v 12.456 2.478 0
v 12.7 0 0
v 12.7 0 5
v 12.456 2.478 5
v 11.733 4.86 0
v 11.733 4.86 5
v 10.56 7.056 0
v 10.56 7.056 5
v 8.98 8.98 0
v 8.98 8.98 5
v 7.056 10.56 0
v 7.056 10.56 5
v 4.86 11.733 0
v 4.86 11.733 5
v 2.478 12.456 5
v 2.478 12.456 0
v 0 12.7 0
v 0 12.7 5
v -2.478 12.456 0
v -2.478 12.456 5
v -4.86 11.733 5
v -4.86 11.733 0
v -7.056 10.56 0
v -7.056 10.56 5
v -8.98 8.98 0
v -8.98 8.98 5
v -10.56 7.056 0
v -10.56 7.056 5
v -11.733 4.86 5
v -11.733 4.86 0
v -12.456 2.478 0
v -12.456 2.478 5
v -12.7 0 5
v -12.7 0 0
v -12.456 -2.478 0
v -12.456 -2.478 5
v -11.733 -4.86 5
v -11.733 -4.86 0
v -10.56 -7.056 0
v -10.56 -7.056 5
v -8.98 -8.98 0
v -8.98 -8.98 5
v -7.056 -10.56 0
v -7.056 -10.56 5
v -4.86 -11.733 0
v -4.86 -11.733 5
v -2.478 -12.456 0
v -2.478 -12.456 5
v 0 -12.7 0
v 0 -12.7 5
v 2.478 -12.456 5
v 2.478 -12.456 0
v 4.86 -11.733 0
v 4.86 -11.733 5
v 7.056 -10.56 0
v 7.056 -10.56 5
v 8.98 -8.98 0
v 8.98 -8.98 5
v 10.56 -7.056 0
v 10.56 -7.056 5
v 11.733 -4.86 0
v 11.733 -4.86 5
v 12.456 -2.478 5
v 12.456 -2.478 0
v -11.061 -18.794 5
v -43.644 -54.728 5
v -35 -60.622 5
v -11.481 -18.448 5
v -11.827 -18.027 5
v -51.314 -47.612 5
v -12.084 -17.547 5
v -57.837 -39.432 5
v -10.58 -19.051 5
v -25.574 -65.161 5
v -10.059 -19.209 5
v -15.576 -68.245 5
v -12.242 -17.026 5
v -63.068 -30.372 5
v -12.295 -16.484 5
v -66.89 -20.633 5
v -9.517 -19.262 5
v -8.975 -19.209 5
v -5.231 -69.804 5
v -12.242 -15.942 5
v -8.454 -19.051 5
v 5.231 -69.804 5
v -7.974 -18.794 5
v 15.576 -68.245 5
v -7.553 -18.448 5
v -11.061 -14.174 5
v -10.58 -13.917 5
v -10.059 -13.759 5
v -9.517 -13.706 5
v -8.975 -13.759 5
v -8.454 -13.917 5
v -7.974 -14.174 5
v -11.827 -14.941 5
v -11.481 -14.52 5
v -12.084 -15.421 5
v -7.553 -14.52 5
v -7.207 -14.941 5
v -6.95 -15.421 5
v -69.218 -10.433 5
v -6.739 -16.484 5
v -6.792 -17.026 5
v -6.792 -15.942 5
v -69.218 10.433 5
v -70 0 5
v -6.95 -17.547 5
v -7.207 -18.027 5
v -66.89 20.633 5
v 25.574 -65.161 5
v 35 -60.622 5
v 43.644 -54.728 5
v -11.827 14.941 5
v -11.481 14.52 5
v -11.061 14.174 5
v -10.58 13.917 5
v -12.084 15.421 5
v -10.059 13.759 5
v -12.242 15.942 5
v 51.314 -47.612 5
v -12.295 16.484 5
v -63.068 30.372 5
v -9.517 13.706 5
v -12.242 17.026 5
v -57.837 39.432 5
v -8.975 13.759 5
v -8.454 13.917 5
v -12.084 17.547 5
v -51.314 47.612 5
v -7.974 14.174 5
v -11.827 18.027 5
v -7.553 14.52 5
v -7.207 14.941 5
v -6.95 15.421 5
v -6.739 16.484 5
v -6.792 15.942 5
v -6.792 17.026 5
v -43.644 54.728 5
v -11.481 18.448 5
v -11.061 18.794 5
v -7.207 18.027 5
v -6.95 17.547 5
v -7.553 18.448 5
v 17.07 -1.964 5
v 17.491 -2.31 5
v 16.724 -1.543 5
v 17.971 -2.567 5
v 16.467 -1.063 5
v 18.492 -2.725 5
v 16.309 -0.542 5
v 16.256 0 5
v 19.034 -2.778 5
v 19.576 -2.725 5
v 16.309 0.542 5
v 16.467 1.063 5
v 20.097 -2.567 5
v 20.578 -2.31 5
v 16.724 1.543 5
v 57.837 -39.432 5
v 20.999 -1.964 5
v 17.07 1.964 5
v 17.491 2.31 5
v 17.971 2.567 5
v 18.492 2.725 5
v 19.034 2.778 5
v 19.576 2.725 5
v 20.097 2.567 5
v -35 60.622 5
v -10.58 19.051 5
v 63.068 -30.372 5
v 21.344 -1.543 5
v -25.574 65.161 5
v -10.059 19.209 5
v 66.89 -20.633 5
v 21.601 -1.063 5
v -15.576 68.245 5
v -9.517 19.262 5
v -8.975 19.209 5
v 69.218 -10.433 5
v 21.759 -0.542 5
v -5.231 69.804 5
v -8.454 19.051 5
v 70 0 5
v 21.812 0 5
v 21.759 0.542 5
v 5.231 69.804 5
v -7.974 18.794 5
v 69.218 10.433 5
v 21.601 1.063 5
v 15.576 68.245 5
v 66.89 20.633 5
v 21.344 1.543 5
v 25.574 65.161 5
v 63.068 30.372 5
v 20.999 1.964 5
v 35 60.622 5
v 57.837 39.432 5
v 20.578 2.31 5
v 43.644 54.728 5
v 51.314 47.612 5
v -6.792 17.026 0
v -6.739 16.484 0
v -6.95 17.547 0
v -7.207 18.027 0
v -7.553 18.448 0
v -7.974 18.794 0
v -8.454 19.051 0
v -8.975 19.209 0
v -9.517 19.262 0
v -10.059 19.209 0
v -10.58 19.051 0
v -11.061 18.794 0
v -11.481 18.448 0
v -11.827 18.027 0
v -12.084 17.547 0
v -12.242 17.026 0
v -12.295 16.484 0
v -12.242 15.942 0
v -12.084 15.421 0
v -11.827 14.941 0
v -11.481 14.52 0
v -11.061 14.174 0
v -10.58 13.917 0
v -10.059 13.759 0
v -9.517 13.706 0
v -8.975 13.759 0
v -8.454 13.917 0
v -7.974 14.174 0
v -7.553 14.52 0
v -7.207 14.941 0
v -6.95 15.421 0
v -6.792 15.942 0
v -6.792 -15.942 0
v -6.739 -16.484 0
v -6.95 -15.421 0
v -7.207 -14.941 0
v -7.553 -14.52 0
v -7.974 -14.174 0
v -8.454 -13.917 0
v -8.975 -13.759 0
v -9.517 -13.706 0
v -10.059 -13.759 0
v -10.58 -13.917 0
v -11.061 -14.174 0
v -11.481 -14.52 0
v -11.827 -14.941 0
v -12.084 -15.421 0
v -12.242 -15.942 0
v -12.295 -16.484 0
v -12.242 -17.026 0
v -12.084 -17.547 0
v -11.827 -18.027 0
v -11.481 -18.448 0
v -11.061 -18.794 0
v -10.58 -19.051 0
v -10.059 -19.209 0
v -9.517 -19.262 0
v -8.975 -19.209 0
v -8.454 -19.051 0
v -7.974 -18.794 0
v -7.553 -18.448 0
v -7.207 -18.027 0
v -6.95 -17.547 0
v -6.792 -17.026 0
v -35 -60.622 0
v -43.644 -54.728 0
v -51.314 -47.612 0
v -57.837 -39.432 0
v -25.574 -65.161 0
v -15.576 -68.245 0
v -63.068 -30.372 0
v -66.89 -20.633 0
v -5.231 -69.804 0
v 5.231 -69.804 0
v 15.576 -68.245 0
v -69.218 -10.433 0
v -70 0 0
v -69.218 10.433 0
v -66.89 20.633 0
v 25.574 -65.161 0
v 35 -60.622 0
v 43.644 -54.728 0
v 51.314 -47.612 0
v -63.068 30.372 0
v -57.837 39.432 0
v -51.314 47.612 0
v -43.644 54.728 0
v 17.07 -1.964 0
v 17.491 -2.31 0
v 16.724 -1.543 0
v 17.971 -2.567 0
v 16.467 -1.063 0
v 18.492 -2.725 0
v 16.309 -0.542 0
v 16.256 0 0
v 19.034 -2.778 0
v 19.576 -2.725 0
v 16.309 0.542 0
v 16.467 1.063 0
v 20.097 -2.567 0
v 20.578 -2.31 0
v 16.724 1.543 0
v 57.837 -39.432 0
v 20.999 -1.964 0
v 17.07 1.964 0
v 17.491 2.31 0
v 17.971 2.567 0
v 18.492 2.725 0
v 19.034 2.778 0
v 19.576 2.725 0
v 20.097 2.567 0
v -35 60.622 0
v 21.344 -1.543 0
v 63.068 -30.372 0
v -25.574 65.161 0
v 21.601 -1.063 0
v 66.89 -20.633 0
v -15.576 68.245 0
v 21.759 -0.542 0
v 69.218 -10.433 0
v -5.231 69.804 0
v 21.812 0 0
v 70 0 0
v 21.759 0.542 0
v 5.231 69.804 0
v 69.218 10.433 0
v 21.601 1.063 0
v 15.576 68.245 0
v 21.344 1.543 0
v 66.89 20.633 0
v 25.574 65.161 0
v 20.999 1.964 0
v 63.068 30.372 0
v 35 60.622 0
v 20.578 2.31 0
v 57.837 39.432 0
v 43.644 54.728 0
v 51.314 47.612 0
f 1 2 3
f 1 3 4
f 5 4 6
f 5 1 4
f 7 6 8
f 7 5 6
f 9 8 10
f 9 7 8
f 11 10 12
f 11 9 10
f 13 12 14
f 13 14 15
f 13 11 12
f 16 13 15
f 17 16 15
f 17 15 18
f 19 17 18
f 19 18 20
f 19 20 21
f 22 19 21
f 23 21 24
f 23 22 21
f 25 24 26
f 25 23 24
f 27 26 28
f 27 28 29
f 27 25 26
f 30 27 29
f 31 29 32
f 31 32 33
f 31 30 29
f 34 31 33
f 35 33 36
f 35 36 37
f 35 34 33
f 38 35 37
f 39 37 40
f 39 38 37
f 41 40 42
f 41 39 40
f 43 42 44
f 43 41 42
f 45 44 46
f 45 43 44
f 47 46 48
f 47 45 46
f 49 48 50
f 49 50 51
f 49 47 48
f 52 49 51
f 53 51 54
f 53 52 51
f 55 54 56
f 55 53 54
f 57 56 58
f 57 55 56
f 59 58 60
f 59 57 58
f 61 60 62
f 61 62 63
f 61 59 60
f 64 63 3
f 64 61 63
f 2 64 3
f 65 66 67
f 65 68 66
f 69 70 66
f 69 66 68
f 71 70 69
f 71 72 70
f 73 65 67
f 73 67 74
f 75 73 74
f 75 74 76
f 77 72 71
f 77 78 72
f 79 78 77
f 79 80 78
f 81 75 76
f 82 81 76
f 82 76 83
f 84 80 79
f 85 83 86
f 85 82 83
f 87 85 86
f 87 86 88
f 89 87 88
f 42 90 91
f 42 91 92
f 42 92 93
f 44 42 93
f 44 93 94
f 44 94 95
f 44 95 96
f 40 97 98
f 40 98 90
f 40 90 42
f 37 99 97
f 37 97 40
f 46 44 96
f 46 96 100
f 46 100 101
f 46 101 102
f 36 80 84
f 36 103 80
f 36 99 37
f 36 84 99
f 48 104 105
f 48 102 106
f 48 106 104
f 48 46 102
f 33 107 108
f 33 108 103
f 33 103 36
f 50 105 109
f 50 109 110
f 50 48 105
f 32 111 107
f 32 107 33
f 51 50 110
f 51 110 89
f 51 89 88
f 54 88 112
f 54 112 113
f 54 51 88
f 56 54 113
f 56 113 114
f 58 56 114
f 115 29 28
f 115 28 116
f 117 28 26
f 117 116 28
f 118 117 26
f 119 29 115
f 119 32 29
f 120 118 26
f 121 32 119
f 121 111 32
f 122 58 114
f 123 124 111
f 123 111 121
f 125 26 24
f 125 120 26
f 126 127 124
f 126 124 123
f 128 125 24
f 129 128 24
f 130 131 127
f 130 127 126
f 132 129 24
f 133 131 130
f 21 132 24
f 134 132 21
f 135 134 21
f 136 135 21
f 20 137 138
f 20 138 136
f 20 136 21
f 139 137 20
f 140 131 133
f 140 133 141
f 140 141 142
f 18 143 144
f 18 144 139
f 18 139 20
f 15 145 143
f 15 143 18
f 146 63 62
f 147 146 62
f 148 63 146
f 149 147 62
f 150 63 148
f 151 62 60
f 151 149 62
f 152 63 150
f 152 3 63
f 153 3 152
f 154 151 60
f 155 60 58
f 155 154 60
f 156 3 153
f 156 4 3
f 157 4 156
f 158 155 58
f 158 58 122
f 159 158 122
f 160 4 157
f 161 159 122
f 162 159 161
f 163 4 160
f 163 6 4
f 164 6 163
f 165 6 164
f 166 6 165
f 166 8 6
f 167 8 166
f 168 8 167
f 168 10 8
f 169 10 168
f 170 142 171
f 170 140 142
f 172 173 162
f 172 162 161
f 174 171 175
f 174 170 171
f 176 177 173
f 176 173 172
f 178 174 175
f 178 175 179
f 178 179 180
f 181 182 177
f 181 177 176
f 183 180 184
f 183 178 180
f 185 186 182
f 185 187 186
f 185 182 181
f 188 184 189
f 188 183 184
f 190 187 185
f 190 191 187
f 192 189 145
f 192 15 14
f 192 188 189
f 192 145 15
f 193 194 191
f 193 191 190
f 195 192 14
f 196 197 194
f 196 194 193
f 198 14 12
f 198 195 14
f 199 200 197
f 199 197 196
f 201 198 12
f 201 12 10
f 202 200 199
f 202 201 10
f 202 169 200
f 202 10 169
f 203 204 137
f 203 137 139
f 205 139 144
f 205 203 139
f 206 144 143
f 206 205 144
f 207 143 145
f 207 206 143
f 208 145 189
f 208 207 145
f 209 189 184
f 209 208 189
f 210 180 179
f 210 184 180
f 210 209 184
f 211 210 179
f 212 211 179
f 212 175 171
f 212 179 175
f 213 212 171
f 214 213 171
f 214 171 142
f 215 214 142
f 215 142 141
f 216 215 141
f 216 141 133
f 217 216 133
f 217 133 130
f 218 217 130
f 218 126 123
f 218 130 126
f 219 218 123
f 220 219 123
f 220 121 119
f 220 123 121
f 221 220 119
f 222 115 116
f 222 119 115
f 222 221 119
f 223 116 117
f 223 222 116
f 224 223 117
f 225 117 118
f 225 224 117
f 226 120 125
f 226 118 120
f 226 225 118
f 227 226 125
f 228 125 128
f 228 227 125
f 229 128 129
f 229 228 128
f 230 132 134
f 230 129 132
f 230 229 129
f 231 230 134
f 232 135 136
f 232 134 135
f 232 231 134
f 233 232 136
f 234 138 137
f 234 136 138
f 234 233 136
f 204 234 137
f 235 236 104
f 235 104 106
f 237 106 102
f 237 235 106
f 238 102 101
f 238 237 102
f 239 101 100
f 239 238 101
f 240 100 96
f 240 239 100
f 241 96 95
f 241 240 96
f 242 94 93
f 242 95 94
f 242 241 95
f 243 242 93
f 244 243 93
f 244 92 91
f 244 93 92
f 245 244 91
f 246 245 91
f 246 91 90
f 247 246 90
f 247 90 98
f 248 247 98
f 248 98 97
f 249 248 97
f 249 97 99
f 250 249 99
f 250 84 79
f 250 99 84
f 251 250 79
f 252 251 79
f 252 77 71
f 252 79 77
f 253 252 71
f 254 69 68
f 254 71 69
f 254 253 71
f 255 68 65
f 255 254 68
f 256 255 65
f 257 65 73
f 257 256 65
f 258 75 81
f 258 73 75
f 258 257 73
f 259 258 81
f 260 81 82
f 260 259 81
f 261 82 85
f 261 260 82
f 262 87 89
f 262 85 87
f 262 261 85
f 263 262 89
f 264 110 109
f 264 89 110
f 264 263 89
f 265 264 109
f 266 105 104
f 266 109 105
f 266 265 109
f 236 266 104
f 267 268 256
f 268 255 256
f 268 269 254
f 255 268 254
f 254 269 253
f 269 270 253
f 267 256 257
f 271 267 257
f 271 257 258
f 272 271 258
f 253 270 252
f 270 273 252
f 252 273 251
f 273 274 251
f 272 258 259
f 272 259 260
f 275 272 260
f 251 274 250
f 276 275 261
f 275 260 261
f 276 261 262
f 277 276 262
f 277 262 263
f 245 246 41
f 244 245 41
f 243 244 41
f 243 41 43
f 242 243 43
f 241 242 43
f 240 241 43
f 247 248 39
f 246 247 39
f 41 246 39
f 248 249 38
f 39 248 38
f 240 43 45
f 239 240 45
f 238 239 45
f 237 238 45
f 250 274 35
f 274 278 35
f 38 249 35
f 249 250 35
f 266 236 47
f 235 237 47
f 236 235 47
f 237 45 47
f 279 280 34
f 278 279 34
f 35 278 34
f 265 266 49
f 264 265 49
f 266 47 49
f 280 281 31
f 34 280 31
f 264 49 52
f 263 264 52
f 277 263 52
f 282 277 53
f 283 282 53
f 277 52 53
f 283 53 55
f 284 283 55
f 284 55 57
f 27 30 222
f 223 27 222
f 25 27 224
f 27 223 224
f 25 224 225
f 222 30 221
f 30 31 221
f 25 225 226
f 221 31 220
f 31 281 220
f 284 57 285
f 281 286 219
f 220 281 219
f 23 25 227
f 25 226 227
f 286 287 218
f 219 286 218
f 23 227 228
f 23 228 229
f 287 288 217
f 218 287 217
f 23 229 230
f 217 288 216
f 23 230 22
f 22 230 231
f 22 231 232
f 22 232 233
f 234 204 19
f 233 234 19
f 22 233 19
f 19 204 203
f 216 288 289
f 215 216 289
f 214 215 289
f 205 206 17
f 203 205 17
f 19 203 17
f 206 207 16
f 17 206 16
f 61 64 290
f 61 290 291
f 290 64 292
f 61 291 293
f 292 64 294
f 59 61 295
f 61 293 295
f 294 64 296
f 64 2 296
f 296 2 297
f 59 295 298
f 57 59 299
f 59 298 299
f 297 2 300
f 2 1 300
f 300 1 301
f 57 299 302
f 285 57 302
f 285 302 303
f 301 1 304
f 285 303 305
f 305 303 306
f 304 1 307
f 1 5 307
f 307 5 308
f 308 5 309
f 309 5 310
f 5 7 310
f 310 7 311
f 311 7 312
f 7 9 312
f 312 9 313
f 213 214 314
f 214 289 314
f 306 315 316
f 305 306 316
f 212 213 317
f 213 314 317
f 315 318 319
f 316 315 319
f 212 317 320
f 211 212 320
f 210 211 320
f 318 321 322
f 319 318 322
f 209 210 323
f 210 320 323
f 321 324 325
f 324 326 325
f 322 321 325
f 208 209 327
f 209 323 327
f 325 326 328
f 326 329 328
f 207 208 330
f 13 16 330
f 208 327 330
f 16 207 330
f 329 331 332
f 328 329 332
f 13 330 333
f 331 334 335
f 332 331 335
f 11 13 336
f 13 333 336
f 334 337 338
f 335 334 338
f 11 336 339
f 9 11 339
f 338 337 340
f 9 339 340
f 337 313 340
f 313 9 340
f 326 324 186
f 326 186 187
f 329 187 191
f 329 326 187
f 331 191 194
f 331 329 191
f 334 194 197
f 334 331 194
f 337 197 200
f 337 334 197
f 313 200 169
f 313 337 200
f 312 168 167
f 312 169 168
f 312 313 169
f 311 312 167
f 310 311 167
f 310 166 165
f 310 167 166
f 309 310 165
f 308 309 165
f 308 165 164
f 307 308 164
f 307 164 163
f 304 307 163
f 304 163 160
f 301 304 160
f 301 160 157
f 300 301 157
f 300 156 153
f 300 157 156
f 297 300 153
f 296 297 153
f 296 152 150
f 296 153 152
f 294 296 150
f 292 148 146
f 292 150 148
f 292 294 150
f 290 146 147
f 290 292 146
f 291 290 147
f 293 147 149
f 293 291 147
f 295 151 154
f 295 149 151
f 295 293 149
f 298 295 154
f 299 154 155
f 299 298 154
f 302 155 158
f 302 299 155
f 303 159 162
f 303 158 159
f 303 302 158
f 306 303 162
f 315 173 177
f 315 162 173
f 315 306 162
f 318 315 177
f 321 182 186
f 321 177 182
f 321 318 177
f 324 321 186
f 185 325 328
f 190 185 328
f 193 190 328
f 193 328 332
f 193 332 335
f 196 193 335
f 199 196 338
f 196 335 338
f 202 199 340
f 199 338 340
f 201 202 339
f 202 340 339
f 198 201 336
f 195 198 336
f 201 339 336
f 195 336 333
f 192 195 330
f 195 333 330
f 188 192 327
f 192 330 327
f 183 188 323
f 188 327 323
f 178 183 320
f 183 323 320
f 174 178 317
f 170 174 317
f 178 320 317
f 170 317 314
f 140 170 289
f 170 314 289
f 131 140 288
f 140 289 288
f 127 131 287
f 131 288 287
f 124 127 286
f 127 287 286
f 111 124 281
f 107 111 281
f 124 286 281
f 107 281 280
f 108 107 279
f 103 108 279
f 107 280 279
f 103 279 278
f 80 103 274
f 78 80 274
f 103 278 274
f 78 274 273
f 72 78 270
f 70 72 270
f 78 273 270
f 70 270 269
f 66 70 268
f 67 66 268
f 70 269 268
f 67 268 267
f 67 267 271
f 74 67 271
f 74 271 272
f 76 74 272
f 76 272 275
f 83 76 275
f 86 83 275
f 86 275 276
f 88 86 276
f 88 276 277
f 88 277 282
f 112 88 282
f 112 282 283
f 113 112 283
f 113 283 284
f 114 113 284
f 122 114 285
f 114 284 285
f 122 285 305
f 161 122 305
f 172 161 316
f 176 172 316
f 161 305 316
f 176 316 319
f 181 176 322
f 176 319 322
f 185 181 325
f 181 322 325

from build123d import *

# Parameters (mm, degrees)
SKETCH1_R               = 70
SKETCH1_R_2             = 12.7
BOSS_EXTRUDE1_DEPTH     = 5
CUT_EXTRUDE1_DEPTH      = 100.121138008
CUT_EXTRUDE1_DEPTH_BACK = 100.121138008
SKETCH3_R               = 2.778125


with BuildPart() as part:
    # Sketch1 → Boss-Extrude1 (new body)
    with BuildSketch(Plane.XY):
        Circle(SKETCH1_R)
        Circle(SKETCH1_R_2, mode=Mode.SUBTRACT)
    extrude(amount=BOSS_EXTRUDE1_DEPTH)

    # Sketch3 → Cut-Extrude1 (cut, two sides: drawn at the far end of the back side and taken through both)
    with BuildSketch(Plane.XY.offset(5).offset(-CUT_EXTRUDE1_DEPTH_BACK)):
        with Locations((-9.5170625, 16.484035789)):
            Circle(SKETCH3_R)
        with Locations((19.034125, 0)):
            Circle(SKETCH3_R)
        with Locations((-9.5170625, -16.484035789)):
            Circle(SKETCH3_R)
    extrude(amount=CUT_EXTRUDE1_DEPTH + CUT_EXTRUDE1_DEPTH_BACK, mode=Mode.SUBTRACT)


solid = part.part
